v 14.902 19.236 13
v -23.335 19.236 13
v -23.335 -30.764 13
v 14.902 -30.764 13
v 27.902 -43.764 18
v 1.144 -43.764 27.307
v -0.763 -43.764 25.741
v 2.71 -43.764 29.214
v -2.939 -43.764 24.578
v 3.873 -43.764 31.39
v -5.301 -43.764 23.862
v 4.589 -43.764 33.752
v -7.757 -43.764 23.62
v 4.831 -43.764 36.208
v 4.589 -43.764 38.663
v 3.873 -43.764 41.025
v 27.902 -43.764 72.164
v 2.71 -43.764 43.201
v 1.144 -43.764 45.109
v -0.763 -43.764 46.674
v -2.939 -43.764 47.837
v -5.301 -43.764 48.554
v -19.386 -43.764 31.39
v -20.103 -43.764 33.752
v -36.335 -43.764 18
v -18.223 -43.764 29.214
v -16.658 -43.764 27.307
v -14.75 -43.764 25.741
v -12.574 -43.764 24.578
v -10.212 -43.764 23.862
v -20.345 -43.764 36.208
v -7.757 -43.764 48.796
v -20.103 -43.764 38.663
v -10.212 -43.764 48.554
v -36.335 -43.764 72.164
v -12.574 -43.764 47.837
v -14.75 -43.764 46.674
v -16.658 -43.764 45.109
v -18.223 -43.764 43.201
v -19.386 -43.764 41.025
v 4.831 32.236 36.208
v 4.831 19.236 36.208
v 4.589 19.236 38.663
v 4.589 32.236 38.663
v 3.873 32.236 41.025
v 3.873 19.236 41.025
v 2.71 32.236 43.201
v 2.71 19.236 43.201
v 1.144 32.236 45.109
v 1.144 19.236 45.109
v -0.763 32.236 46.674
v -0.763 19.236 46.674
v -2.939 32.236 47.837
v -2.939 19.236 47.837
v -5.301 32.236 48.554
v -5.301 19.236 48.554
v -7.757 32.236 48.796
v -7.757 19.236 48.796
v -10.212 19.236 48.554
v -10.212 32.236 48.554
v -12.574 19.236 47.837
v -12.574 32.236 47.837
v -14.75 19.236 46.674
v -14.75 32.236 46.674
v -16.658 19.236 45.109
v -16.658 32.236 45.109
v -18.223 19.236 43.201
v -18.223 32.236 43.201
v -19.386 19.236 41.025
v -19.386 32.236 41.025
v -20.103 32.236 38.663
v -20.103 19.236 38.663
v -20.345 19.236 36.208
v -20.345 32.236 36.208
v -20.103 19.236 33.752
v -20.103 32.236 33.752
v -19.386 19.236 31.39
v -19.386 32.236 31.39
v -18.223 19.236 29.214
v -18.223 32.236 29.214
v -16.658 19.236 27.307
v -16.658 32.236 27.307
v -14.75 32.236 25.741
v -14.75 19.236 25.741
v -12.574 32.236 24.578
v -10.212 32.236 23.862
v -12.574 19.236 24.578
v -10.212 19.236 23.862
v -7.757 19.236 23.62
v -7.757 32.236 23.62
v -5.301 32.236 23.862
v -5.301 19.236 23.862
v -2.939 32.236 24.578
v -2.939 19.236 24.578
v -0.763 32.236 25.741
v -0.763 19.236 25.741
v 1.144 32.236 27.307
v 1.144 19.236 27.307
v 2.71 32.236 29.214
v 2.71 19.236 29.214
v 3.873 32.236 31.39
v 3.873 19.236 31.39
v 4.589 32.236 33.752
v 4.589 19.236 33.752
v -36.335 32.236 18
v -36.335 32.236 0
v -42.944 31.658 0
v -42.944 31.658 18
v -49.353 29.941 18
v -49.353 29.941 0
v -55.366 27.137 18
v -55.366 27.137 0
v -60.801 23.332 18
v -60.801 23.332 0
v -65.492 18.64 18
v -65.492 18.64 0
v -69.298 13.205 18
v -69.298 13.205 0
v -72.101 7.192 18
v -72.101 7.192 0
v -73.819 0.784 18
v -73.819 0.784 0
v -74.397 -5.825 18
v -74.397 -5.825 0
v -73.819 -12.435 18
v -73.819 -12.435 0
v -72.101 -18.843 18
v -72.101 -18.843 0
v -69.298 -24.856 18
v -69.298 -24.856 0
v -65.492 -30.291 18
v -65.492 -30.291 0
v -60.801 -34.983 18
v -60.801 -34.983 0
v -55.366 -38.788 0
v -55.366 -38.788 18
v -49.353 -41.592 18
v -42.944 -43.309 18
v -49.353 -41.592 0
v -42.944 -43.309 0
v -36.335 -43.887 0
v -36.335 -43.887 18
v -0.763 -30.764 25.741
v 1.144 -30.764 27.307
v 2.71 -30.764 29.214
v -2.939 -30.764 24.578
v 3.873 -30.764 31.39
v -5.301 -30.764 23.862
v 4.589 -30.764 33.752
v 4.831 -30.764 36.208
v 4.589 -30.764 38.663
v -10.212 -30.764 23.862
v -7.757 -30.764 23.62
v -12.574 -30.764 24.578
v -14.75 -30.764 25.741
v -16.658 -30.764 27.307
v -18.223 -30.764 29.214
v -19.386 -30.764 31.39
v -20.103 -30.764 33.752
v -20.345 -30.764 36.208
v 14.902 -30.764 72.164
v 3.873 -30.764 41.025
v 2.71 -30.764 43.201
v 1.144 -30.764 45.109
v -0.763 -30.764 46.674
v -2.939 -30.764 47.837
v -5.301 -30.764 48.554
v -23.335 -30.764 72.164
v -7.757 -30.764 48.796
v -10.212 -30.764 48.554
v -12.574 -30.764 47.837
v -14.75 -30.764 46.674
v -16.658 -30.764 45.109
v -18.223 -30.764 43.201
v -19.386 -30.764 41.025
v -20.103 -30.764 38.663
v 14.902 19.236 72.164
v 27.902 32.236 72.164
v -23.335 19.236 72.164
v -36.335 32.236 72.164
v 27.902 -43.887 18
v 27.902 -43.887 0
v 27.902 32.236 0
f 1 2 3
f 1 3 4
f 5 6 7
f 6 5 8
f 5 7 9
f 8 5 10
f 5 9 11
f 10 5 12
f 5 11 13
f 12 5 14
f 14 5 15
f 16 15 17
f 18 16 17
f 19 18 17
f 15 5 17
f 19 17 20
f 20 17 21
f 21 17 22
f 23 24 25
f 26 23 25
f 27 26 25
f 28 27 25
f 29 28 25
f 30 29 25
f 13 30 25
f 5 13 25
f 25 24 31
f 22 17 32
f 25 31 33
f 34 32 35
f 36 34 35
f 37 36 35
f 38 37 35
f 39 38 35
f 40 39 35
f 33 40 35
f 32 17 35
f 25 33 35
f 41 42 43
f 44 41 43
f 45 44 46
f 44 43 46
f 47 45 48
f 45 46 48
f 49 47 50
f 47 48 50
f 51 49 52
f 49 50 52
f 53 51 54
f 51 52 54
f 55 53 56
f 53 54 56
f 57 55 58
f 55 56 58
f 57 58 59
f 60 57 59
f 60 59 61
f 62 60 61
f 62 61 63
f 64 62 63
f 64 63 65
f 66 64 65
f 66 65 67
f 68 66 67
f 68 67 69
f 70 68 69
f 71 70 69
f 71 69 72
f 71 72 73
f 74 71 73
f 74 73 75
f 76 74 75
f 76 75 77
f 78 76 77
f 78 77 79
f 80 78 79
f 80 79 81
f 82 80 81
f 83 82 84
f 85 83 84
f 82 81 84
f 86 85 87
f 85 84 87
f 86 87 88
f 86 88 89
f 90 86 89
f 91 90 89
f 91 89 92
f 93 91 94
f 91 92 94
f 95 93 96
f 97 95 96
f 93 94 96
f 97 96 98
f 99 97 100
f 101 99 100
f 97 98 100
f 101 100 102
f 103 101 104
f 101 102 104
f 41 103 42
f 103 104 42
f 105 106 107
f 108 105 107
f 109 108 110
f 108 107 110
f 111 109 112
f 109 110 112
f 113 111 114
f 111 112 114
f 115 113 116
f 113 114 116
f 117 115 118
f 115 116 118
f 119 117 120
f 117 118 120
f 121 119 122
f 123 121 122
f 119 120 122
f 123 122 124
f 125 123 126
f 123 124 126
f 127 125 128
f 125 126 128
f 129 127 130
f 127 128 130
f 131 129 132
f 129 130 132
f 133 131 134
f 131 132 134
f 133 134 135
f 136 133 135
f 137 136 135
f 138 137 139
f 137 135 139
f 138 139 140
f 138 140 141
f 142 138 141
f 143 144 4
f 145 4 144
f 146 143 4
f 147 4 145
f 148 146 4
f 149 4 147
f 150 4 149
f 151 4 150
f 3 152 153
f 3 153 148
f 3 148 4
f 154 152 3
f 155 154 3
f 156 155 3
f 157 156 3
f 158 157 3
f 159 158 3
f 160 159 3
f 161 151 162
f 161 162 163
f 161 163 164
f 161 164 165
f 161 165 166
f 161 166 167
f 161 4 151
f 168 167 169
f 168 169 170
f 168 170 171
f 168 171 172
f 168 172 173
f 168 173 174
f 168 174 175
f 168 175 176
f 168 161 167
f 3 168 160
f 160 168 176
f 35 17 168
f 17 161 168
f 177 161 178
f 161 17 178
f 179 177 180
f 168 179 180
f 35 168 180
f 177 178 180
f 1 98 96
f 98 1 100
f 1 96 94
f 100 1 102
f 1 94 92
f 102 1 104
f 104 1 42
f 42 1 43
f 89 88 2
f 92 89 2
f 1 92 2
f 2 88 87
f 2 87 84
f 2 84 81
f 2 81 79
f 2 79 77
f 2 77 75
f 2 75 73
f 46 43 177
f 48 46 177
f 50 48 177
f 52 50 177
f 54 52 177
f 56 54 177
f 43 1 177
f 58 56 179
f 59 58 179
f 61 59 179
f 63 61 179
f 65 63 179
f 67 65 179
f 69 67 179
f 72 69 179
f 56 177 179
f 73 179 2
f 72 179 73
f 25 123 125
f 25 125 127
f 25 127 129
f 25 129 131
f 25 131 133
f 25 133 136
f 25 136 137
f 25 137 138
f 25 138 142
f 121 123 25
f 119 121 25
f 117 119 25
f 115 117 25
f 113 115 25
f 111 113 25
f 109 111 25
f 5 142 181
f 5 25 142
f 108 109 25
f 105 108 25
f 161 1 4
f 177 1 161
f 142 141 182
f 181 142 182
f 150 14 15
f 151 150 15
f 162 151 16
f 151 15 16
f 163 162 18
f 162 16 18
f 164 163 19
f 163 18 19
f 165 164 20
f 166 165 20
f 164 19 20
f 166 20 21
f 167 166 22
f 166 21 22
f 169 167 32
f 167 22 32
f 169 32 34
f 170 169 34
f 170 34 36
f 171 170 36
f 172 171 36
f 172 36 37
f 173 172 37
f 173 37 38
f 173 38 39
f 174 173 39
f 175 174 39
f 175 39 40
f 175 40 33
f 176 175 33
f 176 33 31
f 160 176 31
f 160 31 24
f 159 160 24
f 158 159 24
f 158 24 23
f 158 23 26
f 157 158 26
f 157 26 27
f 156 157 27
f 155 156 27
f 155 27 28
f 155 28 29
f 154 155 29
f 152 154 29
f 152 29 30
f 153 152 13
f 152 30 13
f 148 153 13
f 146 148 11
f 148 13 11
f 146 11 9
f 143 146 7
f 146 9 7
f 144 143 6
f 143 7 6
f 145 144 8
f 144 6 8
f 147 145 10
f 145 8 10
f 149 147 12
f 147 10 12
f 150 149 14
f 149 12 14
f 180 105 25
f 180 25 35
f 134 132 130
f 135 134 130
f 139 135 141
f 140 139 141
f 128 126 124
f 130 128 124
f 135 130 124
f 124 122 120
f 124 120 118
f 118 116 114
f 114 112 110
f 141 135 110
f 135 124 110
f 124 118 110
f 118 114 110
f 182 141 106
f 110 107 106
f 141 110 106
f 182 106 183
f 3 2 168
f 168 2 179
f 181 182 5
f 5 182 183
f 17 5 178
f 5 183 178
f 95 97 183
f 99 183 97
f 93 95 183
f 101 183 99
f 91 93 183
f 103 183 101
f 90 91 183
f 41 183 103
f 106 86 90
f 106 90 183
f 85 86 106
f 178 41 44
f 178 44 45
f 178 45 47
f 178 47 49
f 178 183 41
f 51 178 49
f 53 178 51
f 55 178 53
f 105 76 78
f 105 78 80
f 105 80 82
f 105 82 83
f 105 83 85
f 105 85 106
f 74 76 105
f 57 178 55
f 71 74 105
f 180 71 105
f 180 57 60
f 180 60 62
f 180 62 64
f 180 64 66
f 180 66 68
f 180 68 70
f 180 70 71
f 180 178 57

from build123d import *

# Parameters (mm, degrees)
F0_W     = 64.236599952
F0_H     = 76.123803854
F1_DEPTH = 18
F2_W     = 64.236599952
F2_H     = 54.1637830138
F3_DEPTH = 76
F5_T     = -13
F4_R     = 12.5879419165
F6_DEPTH = 205.6


with BuildPart() as f1:
    # F0 (on Top) → F1 (new body)
    with BuildSketch(Plane.XY):
        with Locations((-4.2166989297, -5.8254562318)):
            Rectangle(F0_W, F0_H)
        with BuildLine():
            Line((-36.3349989057, -43.8873581588), (-36.3349989057, 32.2364456952))
            ThreePointArc((-36.3349989057, 32.2364456952), (-74.3969008327, -5.8254562318), (-36.3349989057, -43.8873581588))
        make_face()
    extrude(amount=F1_DEPTH)

    # F2 (on face) → F3 (join)
    with BuildSketch(Plane(origin=(0, 32.2364456952, 0), x_dir=(-1, 0, 0), z_dir=(0, 1, 0))):
        with Locations((4.2166989297, 45.0818915069)):
            Rectangle(F2_W, F2_H)
    extrude(amount=-F3_DEPTH)

    # F5
    f5_openings = [f1.faces().sort_by_distance(p)[0] for p in [
        (-4.216699, -5.763554, 72.163783),
    ]]
    offset(amount=F5_T, openings=f5_openings, kind=Kind.INTERSECTION)

    # F4 (on face) → F6 (cut)
    with BuildSketch(Plane.XZ.offset(43.7635543048)):
        with Locations((-7.7566844411, 36.2076386809)):
            Circle(F4_R)
    extrude(amount=-F6_DEPTH, mode=Mode.SUBTRACT)


solid = f1.part
